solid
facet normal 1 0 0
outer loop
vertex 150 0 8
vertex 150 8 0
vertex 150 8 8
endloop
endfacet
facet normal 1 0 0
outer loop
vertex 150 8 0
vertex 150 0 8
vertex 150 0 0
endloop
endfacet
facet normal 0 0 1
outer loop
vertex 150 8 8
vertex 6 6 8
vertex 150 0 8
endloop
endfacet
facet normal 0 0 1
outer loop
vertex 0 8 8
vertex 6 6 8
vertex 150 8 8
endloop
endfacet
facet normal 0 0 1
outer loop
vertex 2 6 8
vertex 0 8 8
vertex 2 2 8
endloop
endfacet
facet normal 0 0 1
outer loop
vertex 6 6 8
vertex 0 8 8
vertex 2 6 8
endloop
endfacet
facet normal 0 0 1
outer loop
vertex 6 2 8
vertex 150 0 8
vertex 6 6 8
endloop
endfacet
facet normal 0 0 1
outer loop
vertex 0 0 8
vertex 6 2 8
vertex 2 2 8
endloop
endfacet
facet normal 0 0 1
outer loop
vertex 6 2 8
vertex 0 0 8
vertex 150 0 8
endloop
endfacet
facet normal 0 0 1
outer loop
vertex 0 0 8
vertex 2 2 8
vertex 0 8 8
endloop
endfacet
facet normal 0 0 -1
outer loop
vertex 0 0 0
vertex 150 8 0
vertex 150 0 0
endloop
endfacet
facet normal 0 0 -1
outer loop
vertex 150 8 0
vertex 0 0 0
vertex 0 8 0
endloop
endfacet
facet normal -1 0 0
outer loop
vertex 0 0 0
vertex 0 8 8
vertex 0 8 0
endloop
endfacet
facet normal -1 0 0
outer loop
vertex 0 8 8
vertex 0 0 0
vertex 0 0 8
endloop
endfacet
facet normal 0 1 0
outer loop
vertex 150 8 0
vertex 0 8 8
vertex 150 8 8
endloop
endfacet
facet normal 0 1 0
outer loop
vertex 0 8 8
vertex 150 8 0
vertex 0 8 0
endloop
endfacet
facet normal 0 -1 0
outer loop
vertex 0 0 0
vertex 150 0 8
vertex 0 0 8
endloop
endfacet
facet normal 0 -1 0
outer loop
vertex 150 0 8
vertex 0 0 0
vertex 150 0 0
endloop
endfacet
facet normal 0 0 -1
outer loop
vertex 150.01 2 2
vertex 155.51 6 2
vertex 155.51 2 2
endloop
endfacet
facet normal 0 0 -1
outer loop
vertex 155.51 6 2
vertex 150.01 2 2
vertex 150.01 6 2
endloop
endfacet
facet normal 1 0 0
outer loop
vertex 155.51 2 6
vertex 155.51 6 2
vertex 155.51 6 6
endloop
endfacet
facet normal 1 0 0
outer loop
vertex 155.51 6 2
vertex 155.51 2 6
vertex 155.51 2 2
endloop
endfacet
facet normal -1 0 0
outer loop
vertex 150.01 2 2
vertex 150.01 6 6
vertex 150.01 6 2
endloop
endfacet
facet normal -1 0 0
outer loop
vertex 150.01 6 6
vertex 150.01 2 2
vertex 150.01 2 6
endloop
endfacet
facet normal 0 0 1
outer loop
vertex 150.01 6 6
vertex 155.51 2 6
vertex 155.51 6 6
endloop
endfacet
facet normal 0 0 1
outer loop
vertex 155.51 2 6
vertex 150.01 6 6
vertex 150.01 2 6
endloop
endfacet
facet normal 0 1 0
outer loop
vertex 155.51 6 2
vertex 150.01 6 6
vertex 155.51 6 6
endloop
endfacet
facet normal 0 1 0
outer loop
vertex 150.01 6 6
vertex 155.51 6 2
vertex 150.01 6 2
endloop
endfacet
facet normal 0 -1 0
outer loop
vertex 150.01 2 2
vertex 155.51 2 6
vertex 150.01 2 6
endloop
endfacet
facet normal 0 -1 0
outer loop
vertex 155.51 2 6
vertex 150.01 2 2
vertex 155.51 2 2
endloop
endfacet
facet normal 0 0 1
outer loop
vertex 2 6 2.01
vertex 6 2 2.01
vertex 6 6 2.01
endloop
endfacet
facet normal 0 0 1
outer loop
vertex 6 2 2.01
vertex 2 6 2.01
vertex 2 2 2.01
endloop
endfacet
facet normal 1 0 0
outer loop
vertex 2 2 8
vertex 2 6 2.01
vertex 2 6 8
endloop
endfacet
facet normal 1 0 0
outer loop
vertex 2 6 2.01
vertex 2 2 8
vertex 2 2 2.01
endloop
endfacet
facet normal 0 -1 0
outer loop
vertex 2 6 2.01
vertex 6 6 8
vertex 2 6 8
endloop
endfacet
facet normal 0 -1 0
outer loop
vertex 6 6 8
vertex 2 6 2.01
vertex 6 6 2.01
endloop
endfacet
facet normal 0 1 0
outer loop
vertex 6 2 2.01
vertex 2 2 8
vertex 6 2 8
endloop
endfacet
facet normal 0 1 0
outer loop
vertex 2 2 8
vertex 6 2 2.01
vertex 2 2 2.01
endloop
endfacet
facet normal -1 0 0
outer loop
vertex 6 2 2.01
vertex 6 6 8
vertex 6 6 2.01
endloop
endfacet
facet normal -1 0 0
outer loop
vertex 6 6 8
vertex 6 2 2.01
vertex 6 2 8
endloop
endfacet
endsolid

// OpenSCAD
// file: connector.scad
include <common.scad>

module connector_pin() {
    translate([0, 0, (CONNECTOR_DEPTH - LOOSE_FIT) / 2])
        cube([CONNECTOR_WIDTH, CONNECTOR_WIDTH, CONNECTOR_DEPTH - LOOSE_FIT], center = true);
}

module connector_hole() {
    translate([0, 0, CONNECTOR_DEPTH / 2])
        cube([CONNECTOR_WIDTH, CONNECTOR_WIDTH, CONNECTOR_DEPTH], center = true);
}
// file: common.scad
$fa = 1;
$fs = .4;

// Fit tolerances
PRESS_FIT = 0;
TIGHT_FIT = .13;
NORMAL_FIT = .250;
LOOSE_FIT = .5;

DELTA = .01;

// Bar
BAR_LENGTH = 150;
BAR_WIDTH = 8;

// Connector
CONNECTOR_WIDTH = 4;
CONNECTOR_DEPTH = 6;

// Clip
CLIP_HOLE_R = 8;
CLIP_WALL = 4;
CLIP_REDUCE = 1;
CLIP_ANGLE = 30;

// Clip positition
BAR_CLIP_POS = 120;
// main file
include <common.scad>;
include <connector.scad>;

difference() {
    union() {
        // Bar body
        cube([BAR_LENGTH, BAR_WIDTH, BAR_WIDTH]);

        // Connector pin for rear half of the bar
        translate([BAR_LENGTH + DELTA, BAR_WIDTH / 2, BAR_WIDTH / 2])
            rotate([0, 90, 0])
                connector_pin();
    }

    union() {
        // Connector hole for potential 90 degree rear bar
        translate([BAR_WIDTH / 2, BAR_WIDTH / 2, BAR_WIDTH + DELTA])
            rotate([180, 0, 0])
                connector_hole();
    }
}
